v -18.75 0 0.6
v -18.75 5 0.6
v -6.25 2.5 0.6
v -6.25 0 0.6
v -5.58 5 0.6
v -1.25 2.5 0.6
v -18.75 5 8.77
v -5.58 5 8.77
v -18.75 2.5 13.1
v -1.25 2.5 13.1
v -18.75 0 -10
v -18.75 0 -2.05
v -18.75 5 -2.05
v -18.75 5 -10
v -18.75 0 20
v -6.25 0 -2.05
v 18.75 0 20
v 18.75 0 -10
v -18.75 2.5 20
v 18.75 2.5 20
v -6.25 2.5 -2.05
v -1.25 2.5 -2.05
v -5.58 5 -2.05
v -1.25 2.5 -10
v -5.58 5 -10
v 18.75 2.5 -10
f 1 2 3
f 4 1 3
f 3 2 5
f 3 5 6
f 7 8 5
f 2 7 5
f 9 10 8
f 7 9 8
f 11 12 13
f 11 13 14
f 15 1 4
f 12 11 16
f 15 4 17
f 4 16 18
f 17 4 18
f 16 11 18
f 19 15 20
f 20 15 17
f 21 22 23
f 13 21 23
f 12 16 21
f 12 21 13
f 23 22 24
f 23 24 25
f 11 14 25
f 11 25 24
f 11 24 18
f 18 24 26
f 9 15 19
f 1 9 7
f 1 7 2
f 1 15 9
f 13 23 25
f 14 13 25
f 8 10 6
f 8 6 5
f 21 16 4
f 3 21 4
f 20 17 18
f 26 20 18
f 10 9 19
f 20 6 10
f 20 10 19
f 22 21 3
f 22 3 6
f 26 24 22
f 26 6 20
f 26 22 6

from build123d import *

# Parameters (mm, degrees)
SKETCH1_W           = 37.5
SKETCH1_H           = 40
BOSS_EXTRUDE1_DEPTH = 2.5
SKETCH2_W           = 12.5
SKETCH2_H           = 2.65
CUT_EXTRUDE1_DEPTH  = 28.528394432
SKETCH3_W           = 12.5
SKETCH3_H           = 17.95
SKETCH3_H_2         = 7.5
BOSS_EXTRUDE2_DEPTH = 2.5
SKETCH4_W           = 37.5
SKETCH4_H           = 10
CUT_EXTRUDE2_DEPTH  = 28.866871012


with BuildPart() as part:
    # Sketch1 → Boss-Extrude1 (new body)
    with BuildSketch(Plane(origin=(0, 0, 0), x_dir=(1, 0, 0), z_dir=(0, 1, 0))):
        Rectangle(SKETCH1_W, SKETCH1_H)
    extrude(amount=BOSS_EXTRUDE1_DEPTH)

    # Sketch2 → Cut-Extrude1 (cut, through all)
    with BuildSketch(Plane.XZ):
        with Locations((-12.5, -0.725)):
            Rectangle(SKETCH2_W, SKETCH2_H)
    extrude(amount=-CUT_EXTRUDE1_DEPTH, mode=Mode.SUBTRACT)

    # Sketch3 → Boss-Extrude2 (add)
    with BuildSketch(Plane(origin=(0, 2.5, 0), x_dir=(1, 0, 0), z_dir=(0, 1, 0))):
        with Locations((-12.5, 11.025)):
            Rectangle(SKETCH3_W, SKETCH3_H)
        with Locations((-12.5, -4.35)):
            Rectangle(SKETCH3_W, SKETCH3_H_2)
    extrude(amount=BOSS_EXTRUDE2_DEPTH)

    # Sketch4 → Cut-Extrude2 (cut, through all)
    with BuildSketch(Plane(origin=(0, 5, 0), x_dir=(1, 0, 0), z_dir=(0, 1, 0))):
        with Locations((0, 15)):
            Rectangle(SKETCH4_W, SKETCH4_H)
    extrude(amount=-CUT_EXTRUDE2_DEPTH, mode=Mode.SUBTRACT)

    # Chamfer1
    # the kernel refuses this chamfer: 5, 2.886751346 mm, written as the material it adds along each edge
    with BuildSketch(Plane(origin=(-6.25, 2.5, -2.05), x_dir=(0.9998132206222079, -0.019326765612700723, -1.5830863978385058e-15), z_dir=(0, 0, -1))) as chamfer1_piece_1_section:
        with BuildLine():
            Line((5.174171509, 0), (-0.230896973, -2.982845988))
            Line((-0.230896973, -2.982845988), (-0.330878295, -2.980913312))
            ThreePointArc((-0.330878295, -2.980913312), (-0.128843444, -1.491164065), (-0.099981322, 0.001932677))
            Line((-0.099981322, 0.001932677), (0.001932677, 0.099981322))
            ThreePointArc((0.001932677, 0.099981322), (2.588052093, 0.049990661), (5.176104186, 0.099981322))
            Line((5.176104186, 0.099981322), (5.174171509, 0))
        make_face()
    chamfer1_piece_1 = extrude(amount=7.95, mode=Mode.PRIVATE)
    chamfer1_piece_1 = split(chamfer1_piece_1, bisect_by=Plane(origin=(-6.25, 3.354735535, -6.025), z_dir=(1, 0, 0)), keep=Keep.TOP, mode=Mode.PRIVATE)
    chamfer1_piece_1 = split(chamfer1_piece_1, bisect_by=Plane(origin=(-4.46158964, 5, -6.025), z_dir=(0, -1, 0)), keep=Keep.TOP, mode=Mode.PRIVATE)
    add(chamfer1_piece_1)
    with BuildSketch(Plane(origin=(-6.25, 2.5, 8.1), x_dir=(0, -0.019326765612700723, 0.9998132206222079), z_dir=(-1, 0, 0))) as chamfer1_piece_2_section:
        with BuildLine():
            Line((5.174171509, 0), (-0.230896973, 2.982845988))
            Line((-0.230896973, 2.982845988), (-0.330878295, 2.980913312))
            ThreePointArc((-0.330878295, 2.980913312), (-0.128843444, 1.491164065), (-0.099981322, -0.001932677))
            Line((-0.099981322, -0.001932677), (0.001932677, -0.099981322))
            ThreePointArc((0.001932677, -0.099981322), (2.588052093, -0.049990661), (5.176104186, -0.099981322))
            Line((5.176104186, -0.099981322), (5.174171509, 0))
        make_face()
    chamfer1_piece_2 = extrude(amount=12.5, mode=Mode.PRIVATE)
    chamfer1_piece_2 = split(chamfer1_piece_2, bisect_by=Plane(origin=(-12.5, 5, 9.824344196), z_dir=(0, -1, 0)), keep=Keep.TOP, mode=Mode.PRIVATE)
    add(chamfer1_piece_2)
    with BuildSketch(Plane(origin=(-6.25, 2.5, 0.6), x_dir=(0.9998132206222079, -0.019326765612700723, 0), z_dir=(0, 0, 1))) as chamfer1_piece_3_section:
        with BuildLine():
            Line((5.174171509, 0), (-0.230896973, 2.982845988))
            Line((-0.230896973, 2.982845988), (-0.330878295, 2.980913312))
            ThreePointArc((-0.330878295, 2.980913312), (-0.128843444, 1.491164065), (-0.099981322, -0.001932677))
            Line((-0.099981322, -0.001932677), (0.001932677, -0.099981322))
            ThreePointArc((0.001932677, -0.099981322), (2.588052093, -0.049990661), (5.176104186, -0.099981322))
            Line((5.176104186, -0.099981322), (5.174171509, 0))
        make_face()
    chamfer1_piece_3 = extrude(amount=7.5, mode=Mode.PRIVATE)
    chamfer1_piece_3 = split(chamfer1_piece_3, bisect_by=Plane(origin=(-6.25, 3.354735535, 4.35), z_dir=(1, 0, 0)), keep=Keep.TOP, mode=Mode.PRIVATE)
    chamfer1_piece_3 = split(chamfer1_piece_3, bisect_by=Plane(origin=(-4.46158964, 5, 4.35), z_dir=(0, -1, 0)), keep=Keep.TOP, mode=Mode.PRIVATE)
    add(chamfer1_piece_3)
    with BuildSketch(Plane(origin=(-6.25, 2.5, 0.6), x_dir=(0.9998132206222079, -0.019326765612700723, 0), z_dir=(0, 0, 1))) as chamfer1_piece_4a_section:
        with BuildLine():
            Line((5.174171509, 0), (-0.230896973, 2.982845988))
            Line((-0.230896973, 2.982845988), (-0.330878295, 2.980913312))
            ThreePointArc((-0.330878295, 2.980913312), (-0.128843444, 1.491164065), (-0.099981322, -0.001932677))
            Line((-0.099981322, -0.001932677), (0.001932677, -0.099981322))
            ThreePointArc((0.001932677, -0.099981322), (2.588052093, -0.049990661), (5.176104186, -0.099981322))
            Line((5.176104186, -0.099981322), (5.174171509, 0))
        make_face()
    chamfer1_piece_4a = extrude(amount=20.435428773, mode=Mode.PRIVATE)
    chamfer1_piece_4a = split(chamfer1_piece_4a, bisect_by=Plane(origin=(-4.46158964, 3.354735535, 20), z_dir=(0, 0, -1)), keep=Keep.TOP, mode=Mode.PRIVATE)
    chamfer1_piece_4a = split(chamfer1_piece_4a, bisect_by=Plane(origin=(-6.25, 3.354735535, 14.05), z_dir=(1, 0, 0)), keep=Keep.TOP, mode=Mode.PRIVATE)
    chamfer1_piece_4a = split(chamfer1_piece_4a, bisect_by=Plane(origin=(-4.46158964, 5, 14.05), z_dir=(0, -1, 0)), keep=Keep.TOP, mode=Mode.PRIVATE)
    chamfer1_piece_4a = split(chamfer1_piece_4a, bisect_by=Plane(origin=(-4.46158964, 3.354735535, 8.1), z_dir=(0, 0, 1)), keep=Keep.TOP, mode=Mode.PRIVATE)
    with BuildSketch(Plane(origin=(6.685428773, 2.5, 8.1), x_dir=(0, -0.019326765612700723, 0.9998132206222079), z_dir=(-1, 0, 0))) as chamfer1_piece_4b_section:
        with BuildLine():
            Line((5.174171509, 0), (-0.230896973, 2.982845988))
            Line((-0.230896973, 2.982845988), (-0.330878295, 2.980913312))
            ThreePointArc((-0.330878295, 2.980913312), (-0.128843444, 1.491164065), (-0.099981322, -0.001932677))
            Line((-0.099981322, -0.001932677), (0.001932677, -0.099981322))
            ThreePointArc((0.001932677, -0.099981322), (2.588052093, -0.049990661), (5.176104186, -0.099981322))
            Line((5.176104186, -0.099981322), (5.174171509, 0))
        make_face()
    chamfer1_piece_4b = extrude(amount=25.435428773, mode=Mode.PRIVATE)
    chamfer1_piece_4b = split(chamfer1_piece_4b, bisect_by=Plane(origin=(0.217714387, 5, 9.824344196), z_dir=(0, -1, 0)), keep=Keep.TOP, mode=Mode.PRIVATE)
    chamfer1_piece_4b = split(chamfer1_piece_4b, bisect_by=Plane(origin=(-6.25, 3.374002547, 9.824344196), z_dir=(1, 0, 0)), keep=Keep.TOP, mode=Mode.PRIVATE)
    chamfer1_piece_4 = chamfer1_piece_4a & chamfer1_piece_4b
    add(chamfer1_piece_4)


solid = part.part
